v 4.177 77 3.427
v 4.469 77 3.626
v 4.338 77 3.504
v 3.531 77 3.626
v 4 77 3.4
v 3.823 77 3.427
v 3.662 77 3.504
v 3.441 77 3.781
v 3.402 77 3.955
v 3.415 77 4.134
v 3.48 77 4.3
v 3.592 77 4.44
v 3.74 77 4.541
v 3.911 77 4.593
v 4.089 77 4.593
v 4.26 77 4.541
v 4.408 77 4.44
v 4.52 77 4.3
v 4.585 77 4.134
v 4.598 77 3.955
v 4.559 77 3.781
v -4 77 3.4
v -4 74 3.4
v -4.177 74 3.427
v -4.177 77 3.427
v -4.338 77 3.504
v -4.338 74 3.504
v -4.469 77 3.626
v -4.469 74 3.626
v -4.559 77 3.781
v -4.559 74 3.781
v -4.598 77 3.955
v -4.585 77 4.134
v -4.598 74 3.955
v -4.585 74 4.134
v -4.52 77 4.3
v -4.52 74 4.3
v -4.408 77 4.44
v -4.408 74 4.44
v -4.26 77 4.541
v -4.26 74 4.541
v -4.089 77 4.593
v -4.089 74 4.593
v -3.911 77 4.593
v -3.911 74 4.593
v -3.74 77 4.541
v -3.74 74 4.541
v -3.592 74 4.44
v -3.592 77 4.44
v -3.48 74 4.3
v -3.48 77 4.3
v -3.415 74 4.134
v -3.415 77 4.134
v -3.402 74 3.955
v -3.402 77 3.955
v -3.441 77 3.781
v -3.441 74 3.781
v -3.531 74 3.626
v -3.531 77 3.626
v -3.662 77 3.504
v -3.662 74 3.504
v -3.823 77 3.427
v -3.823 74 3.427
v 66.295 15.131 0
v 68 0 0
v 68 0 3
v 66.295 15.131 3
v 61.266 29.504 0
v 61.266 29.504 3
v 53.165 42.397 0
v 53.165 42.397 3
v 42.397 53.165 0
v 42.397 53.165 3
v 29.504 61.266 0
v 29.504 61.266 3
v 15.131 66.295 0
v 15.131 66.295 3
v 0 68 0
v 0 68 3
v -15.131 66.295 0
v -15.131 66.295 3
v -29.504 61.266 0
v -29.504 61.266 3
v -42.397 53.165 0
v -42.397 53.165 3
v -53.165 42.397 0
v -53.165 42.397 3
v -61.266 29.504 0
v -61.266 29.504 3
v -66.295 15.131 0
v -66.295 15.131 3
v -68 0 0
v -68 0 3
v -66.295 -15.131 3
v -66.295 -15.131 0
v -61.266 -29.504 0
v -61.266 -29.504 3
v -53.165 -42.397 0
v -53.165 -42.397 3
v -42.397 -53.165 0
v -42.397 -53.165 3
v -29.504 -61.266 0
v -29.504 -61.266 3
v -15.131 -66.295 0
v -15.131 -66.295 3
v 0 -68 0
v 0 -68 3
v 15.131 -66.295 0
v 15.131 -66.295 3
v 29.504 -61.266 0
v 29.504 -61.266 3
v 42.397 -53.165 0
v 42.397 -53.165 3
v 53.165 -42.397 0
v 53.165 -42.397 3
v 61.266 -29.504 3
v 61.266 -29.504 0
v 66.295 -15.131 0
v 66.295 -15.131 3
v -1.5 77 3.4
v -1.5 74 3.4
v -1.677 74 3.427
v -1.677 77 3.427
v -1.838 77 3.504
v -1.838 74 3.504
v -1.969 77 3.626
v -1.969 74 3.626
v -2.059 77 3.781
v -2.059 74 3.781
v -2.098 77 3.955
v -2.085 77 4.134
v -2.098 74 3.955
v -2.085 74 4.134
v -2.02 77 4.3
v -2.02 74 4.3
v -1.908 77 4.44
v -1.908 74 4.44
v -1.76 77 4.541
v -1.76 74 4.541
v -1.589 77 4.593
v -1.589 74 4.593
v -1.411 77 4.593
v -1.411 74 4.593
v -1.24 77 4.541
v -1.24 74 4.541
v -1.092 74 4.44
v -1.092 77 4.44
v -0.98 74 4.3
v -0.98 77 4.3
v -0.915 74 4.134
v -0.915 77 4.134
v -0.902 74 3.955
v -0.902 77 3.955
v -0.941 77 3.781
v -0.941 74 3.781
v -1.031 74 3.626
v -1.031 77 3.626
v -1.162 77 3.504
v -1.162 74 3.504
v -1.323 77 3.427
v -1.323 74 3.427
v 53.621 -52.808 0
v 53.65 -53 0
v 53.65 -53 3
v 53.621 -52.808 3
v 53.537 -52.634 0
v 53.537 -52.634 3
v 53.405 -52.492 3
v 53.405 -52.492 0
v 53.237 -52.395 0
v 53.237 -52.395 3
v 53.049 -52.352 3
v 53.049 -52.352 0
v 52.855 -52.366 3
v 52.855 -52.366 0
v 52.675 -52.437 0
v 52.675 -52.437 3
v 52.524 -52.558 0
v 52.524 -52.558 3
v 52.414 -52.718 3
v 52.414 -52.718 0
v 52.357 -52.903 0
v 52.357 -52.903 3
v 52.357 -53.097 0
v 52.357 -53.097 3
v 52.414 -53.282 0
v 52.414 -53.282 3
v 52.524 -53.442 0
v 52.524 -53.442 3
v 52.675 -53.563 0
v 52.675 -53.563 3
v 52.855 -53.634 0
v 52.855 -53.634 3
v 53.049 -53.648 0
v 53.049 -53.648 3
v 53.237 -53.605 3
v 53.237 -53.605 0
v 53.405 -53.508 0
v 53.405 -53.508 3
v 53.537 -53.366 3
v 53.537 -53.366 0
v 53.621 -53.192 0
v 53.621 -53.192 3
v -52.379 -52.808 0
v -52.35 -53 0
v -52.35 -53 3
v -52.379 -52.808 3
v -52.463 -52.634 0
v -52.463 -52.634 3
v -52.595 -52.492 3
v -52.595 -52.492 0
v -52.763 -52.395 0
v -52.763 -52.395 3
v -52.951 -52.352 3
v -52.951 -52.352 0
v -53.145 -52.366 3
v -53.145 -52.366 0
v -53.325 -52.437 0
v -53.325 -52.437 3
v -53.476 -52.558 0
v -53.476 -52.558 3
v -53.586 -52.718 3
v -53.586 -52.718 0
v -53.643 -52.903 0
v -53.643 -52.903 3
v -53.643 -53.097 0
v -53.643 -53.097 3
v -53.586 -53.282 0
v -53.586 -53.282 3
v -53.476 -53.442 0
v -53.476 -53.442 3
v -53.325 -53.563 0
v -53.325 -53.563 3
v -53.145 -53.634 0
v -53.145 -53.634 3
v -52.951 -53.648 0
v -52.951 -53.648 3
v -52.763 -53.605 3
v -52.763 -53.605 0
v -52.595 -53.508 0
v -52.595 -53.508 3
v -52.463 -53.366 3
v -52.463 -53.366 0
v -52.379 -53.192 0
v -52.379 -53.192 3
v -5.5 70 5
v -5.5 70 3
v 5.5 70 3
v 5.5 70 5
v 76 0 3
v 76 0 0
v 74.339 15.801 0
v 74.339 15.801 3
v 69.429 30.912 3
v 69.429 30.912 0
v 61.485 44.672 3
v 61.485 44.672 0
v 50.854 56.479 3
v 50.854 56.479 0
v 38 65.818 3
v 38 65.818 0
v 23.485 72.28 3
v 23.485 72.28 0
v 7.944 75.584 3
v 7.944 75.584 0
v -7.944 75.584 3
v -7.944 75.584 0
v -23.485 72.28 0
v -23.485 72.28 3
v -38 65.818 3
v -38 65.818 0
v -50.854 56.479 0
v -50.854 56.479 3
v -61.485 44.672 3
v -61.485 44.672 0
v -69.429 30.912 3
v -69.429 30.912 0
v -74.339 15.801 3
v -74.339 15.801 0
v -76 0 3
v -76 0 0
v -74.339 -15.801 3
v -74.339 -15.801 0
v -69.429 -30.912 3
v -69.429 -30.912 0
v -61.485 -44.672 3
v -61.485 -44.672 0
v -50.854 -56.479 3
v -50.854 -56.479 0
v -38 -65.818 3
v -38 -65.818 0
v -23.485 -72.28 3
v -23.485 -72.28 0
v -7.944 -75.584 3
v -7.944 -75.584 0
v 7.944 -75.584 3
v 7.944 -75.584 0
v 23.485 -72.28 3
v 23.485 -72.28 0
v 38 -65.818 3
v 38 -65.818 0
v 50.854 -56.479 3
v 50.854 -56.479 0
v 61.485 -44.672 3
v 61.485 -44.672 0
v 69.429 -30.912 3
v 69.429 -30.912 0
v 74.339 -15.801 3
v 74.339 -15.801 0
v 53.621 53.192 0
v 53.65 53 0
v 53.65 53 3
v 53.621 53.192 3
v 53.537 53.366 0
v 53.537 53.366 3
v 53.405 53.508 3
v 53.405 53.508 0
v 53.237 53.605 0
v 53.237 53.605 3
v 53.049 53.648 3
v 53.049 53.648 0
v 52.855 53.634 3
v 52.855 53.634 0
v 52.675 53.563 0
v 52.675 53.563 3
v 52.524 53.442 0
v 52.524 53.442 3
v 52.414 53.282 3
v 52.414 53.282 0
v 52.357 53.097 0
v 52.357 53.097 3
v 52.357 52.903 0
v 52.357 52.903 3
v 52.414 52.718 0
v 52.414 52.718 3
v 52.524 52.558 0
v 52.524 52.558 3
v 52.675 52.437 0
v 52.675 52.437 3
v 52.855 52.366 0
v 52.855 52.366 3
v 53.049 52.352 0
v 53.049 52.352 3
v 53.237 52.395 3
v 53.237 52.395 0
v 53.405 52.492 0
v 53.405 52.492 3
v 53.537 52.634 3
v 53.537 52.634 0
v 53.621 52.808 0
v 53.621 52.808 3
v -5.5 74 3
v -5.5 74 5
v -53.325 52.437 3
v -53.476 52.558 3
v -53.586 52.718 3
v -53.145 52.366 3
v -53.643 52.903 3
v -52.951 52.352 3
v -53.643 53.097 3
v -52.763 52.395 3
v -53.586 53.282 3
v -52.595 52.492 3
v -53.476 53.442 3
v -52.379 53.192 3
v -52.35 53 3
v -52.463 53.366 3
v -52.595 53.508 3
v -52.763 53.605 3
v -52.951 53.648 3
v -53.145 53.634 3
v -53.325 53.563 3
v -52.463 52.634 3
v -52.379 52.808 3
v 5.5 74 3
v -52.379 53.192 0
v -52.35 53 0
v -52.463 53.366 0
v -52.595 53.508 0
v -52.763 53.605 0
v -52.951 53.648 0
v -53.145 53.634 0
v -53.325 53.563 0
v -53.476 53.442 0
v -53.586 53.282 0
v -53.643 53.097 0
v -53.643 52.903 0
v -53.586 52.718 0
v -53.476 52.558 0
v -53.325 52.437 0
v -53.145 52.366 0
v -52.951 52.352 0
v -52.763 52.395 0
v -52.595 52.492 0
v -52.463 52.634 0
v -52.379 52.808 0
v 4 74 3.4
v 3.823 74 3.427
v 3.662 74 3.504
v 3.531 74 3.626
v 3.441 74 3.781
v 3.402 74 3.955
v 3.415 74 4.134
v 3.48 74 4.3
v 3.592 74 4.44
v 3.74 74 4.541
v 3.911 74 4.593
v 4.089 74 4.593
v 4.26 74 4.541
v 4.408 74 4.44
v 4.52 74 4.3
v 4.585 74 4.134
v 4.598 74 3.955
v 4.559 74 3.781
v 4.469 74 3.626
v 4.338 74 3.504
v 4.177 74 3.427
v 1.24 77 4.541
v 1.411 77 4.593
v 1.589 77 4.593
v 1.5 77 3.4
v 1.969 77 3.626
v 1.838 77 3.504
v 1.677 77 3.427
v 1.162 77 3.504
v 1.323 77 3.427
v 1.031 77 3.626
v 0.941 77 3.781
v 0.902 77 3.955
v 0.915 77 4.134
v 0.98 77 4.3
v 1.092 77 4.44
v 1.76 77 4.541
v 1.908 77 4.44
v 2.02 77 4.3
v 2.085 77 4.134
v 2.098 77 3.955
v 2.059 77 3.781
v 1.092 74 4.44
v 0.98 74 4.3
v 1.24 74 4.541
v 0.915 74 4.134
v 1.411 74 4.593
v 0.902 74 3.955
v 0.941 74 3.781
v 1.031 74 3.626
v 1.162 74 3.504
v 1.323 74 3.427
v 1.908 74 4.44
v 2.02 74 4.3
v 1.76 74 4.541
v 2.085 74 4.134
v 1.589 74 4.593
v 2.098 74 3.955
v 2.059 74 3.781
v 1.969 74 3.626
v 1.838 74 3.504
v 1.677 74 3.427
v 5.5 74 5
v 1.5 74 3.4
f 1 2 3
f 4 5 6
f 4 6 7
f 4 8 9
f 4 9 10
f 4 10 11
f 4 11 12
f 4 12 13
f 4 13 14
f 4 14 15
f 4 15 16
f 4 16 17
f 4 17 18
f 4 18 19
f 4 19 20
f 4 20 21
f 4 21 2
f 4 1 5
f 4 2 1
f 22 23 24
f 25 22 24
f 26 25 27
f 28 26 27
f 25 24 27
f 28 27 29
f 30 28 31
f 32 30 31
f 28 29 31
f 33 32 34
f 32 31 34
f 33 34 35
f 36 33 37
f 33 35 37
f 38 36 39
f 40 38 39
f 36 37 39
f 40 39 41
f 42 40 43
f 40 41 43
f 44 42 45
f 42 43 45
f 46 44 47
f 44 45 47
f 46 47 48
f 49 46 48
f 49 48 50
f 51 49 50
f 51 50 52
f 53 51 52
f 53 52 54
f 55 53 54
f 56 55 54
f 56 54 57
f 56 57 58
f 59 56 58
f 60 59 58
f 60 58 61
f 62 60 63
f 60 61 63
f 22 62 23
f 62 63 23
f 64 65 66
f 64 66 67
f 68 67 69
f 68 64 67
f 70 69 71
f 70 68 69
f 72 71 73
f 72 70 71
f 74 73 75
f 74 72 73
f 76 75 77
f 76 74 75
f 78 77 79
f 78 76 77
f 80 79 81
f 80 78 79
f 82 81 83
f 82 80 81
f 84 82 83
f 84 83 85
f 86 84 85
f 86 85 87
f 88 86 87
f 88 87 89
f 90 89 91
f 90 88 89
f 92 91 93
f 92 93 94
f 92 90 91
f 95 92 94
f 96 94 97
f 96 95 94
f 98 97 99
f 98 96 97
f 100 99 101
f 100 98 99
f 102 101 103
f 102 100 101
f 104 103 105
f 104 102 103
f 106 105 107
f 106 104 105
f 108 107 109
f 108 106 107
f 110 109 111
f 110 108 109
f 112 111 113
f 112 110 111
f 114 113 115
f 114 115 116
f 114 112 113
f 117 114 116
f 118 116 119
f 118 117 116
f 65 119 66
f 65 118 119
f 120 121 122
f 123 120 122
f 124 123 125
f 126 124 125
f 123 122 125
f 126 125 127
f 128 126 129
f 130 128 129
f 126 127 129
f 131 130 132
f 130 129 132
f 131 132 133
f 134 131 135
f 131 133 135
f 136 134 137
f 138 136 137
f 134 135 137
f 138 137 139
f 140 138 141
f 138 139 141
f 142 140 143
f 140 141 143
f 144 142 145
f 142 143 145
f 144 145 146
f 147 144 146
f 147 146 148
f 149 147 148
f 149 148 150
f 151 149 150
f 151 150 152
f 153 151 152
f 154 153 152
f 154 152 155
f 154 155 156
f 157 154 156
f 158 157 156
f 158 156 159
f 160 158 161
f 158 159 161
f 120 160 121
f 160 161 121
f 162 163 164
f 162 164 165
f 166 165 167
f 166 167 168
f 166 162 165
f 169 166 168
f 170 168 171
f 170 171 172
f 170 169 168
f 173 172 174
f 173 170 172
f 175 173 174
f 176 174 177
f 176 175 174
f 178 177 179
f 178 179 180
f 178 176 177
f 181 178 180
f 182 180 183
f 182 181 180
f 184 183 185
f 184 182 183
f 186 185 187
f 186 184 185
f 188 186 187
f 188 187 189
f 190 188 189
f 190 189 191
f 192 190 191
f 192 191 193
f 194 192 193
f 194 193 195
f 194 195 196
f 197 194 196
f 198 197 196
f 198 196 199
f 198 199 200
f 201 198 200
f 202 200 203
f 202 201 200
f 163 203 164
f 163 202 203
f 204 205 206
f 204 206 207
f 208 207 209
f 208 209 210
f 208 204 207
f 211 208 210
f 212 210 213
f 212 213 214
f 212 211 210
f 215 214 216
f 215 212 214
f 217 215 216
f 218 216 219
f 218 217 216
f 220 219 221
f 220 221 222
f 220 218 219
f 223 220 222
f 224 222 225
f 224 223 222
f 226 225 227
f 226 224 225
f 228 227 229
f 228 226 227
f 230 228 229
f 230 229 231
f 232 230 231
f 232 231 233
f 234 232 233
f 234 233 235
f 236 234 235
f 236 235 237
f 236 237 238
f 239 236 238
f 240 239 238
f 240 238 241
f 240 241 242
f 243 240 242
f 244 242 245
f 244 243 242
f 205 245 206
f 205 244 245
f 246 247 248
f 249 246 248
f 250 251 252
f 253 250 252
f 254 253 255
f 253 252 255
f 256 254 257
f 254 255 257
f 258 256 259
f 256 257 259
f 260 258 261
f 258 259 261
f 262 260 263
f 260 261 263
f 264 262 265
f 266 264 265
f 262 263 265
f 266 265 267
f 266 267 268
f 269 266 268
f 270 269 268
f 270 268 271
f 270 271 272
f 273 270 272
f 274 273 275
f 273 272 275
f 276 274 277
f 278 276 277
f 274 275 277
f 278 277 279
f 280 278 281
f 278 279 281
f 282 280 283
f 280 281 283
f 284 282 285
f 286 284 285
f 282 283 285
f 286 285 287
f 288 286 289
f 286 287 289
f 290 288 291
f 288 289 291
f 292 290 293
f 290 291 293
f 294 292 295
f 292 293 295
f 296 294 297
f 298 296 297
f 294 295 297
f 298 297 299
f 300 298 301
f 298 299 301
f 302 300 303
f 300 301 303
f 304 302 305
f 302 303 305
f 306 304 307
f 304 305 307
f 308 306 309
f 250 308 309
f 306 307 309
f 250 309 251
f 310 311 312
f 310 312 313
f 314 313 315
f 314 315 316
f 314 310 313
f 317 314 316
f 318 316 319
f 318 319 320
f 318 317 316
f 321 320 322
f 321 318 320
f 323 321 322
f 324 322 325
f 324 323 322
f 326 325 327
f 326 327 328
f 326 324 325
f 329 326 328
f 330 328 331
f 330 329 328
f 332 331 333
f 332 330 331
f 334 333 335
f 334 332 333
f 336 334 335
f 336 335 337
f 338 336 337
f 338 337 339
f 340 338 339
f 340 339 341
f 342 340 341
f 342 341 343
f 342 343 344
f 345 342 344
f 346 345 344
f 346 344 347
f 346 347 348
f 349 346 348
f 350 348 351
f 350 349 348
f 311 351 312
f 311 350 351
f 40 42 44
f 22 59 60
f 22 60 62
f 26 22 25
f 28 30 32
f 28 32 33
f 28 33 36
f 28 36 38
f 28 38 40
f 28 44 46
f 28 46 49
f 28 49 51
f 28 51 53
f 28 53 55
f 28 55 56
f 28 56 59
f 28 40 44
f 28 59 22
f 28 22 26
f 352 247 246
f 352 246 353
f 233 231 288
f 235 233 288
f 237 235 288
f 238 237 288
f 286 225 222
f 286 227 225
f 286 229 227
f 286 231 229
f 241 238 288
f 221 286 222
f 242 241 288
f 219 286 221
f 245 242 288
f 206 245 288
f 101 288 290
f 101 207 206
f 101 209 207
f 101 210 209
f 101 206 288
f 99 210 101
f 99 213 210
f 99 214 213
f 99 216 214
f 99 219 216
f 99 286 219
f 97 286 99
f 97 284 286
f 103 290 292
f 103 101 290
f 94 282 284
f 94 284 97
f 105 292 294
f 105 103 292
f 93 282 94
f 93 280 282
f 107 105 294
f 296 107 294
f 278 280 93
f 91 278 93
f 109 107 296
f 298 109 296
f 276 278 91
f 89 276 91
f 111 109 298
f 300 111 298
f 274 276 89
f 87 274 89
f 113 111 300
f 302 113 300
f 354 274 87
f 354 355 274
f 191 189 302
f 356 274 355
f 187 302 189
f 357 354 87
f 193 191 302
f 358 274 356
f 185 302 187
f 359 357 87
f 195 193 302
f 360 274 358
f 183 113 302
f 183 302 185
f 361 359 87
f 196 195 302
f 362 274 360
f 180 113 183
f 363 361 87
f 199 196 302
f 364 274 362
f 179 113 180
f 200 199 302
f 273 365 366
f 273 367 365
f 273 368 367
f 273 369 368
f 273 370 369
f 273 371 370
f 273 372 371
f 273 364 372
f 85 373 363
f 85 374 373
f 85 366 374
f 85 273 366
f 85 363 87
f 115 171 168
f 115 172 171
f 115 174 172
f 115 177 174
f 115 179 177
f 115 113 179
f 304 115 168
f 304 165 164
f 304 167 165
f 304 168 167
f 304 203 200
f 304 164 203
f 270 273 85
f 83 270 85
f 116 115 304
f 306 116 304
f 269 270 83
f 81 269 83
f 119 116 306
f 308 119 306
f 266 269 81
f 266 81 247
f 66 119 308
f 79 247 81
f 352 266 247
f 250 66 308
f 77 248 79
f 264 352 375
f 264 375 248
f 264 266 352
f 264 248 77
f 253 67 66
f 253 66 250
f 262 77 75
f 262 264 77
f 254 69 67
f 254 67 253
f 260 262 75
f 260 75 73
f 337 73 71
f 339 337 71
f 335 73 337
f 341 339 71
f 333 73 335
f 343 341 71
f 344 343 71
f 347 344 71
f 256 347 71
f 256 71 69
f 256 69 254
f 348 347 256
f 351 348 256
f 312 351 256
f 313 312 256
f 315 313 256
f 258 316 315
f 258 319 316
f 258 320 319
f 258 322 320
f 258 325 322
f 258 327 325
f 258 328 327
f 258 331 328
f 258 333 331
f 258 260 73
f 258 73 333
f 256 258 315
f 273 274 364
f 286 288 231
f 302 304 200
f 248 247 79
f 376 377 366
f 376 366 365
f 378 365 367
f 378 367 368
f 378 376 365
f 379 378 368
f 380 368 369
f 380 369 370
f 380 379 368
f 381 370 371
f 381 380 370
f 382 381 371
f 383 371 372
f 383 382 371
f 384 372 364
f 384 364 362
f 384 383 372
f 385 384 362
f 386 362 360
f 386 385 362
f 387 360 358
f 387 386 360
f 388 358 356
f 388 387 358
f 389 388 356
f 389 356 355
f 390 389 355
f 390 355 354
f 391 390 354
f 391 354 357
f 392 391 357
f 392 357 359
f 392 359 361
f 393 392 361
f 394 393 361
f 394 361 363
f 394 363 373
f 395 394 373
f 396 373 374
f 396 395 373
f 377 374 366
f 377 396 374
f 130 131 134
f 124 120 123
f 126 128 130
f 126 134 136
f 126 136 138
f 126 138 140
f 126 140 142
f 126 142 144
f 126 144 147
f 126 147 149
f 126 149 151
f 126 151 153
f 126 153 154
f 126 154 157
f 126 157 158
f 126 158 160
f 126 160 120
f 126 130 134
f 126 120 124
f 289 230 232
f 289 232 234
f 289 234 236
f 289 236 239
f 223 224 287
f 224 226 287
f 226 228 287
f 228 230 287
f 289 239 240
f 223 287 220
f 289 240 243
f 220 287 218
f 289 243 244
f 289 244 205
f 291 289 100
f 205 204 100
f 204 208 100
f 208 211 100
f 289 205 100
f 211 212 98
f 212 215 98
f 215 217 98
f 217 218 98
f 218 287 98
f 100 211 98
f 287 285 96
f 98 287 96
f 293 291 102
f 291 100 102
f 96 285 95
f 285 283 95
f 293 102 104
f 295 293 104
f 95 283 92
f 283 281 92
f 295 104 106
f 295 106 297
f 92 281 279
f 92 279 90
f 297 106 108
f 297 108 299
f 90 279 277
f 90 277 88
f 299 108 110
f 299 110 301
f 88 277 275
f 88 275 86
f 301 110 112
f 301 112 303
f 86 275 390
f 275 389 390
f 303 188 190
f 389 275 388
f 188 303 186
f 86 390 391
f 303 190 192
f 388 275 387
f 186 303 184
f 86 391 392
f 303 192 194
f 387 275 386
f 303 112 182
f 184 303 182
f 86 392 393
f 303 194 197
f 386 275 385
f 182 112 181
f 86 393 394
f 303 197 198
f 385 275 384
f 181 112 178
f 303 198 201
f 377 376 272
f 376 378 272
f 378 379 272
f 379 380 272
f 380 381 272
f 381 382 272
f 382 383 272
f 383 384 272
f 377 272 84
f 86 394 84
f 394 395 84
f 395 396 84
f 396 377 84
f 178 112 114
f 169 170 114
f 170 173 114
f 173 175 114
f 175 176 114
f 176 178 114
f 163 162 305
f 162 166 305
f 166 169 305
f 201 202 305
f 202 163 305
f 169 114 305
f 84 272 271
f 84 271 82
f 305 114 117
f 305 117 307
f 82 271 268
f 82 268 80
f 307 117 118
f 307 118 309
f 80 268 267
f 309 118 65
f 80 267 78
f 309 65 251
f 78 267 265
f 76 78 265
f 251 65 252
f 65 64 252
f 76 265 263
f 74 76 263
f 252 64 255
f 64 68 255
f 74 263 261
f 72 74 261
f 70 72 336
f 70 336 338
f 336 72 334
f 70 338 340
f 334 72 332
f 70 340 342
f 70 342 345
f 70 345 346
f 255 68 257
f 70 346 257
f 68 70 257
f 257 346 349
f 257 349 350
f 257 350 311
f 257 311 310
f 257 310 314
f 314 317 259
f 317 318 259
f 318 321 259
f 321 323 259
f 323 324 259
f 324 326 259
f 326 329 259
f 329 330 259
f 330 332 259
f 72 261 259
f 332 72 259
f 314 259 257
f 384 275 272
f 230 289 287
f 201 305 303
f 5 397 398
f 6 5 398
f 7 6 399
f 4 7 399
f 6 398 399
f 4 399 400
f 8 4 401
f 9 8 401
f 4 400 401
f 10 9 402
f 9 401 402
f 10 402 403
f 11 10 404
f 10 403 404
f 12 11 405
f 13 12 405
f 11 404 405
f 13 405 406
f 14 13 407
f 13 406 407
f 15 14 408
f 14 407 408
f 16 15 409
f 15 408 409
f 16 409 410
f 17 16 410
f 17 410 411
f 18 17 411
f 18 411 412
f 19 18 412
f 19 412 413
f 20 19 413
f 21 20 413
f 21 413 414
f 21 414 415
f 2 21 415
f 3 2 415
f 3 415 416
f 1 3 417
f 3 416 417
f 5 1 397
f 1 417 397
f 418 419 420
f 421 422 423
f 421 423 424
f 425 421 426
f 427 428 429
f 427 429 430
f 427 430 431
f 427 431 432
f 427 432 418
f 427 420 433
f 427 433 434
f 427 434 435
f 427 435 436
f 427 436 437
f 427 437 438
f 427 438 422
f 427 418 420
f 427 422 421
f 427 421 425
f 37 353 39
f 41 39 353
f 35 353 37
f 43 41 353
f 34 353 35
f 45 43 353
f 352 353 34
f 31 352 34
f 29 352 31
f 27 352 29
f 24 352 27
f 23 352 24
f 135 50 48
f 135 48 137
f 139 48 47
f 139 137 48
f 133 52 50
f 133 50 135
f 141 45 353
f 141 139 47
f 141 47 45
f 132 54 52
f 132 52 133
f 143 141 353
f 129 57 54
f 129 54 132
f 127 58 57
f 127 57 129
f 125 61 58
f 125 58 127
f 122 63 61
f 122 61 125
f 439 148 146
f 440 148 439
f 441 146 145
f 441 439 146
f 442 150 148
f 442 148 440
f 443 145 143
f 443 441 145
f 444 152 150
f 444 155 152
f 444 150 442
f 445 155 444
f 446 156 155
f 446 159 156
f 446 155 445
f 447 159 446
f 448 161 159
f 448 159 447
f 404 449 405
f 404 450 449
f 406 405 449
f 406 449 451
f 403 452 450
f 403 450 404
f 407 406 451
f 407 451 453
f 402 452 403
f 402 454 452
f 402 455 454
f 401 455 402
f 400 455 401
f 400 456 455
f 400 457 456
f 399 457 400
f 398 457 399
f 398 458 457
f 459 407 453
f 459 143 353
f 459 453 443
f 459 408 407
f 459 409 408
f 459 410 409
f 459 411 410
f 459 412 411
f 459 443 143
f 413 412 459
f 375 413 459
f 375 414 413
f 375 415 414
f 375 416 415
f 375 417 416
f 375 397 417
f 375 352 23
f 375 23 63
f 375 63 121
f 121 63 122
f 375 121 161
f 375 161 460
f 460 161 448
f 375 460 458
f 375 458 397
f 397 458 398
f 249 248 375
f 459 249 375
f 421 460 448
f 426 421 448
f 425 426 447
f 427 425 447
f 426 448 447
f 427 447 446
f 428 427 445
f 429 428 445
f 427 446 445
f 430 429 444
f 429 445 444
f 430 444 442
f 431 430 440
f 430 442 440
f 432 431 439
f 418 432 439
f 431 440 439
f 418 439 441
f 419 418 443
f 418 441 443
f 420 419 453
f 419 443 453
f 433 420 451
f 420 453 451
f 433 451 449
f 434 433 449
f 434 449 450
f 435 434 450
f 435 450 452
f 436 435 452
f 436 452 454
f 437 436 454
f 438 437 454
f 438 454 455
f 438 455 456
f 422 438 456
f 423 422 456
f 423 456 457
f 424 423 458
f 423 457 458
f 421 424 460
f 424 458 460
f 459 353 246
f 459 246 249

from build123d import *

# Parameters (mm, degrees)
EXTRUDE_1_OUTLINE_R   = 76
EXTRUDE_1_OUTLINE_R_2 = 0.65
EXTRUDE_1_OUTLINE_R_3 = 68
EXTRUDE_1_DEPTH       = 3
SKETCH_2_W            = 11
SKETCH_2_H            = 4
EXTRUDE_2_DEPTH       = 2
SKETCH_3_R            = 0.6
EXTRUDE_3_DEPTH       = 3


# Read off the part's stored shape, not the designer's step: 凸台-拉伸1
with BuildPart() as part:
    # 凸台-拉伸1 outline → 凸台-拉伸1 (new body)
    with BuildSketch(Plane.XY):
        Circle(EXTRUDE_1_OUTLINE_R)
        with Locations((-53, -53)):
            Circle(EXTRUDE_1_OUTLINE_R_2, mode=Mode.SUBTRACT)
        with Locations((53, -53)):
            Circle(EXTRUDE_1_OUTLINE_R_2, mode=Mode.SUBTRACT)
        with Locations((-53, 53)):
            Circle(EXTRUDE_1_OUTLINE_R_2, mode=Mode.SUBTRACT)
        Circle(EXTRUDE_1_OUTLINE_R_3, mode=Mode.SUBTRACT)
        with Locations((53, 53)):
            Circle(EXTRUDE_1_OUTLINE_R_2, mode=Mode.SUBTRACT)
    extrude(amount=EXTRUDE_1_DEPTH)

    # 草图2 → 凸台-拉伸2 (add)
    with BuildSketch(Plane.XY.offset(3)):
        with Locations((0, 72)):
            Rectangle(SKETCH_2_W, SKETCH_2_H)
    extrude(amount=EXTRUDE_2_DEPTH)

    # 草图3 → 凸台-拉伸3 (add)
    with BuildSketch(Plane(origin=(0, 74, 0), x_dir=(1, 0, 0), z_dir=(0, 1, 0))):
        with Locations(Location((-1.5, -4, 0), (0, 0, 90))):
            Circle(SKETCH_3_R)
        with Locations(Location((1.5, -4, 0), (0, 0, 90))):
            Circle(SKETCH_3_R)
        with Locations(Location((-4, -4, 0), (0, 0, 90))):
            Circle(SKETCH_3_R)
        with Locations(Location((4, -4, 0), (0, 0, 90))):
            Circle(SKETCH_3_R)
    extrude(amount=EXTRUDE_3_DEPTH)


solid = part.part
